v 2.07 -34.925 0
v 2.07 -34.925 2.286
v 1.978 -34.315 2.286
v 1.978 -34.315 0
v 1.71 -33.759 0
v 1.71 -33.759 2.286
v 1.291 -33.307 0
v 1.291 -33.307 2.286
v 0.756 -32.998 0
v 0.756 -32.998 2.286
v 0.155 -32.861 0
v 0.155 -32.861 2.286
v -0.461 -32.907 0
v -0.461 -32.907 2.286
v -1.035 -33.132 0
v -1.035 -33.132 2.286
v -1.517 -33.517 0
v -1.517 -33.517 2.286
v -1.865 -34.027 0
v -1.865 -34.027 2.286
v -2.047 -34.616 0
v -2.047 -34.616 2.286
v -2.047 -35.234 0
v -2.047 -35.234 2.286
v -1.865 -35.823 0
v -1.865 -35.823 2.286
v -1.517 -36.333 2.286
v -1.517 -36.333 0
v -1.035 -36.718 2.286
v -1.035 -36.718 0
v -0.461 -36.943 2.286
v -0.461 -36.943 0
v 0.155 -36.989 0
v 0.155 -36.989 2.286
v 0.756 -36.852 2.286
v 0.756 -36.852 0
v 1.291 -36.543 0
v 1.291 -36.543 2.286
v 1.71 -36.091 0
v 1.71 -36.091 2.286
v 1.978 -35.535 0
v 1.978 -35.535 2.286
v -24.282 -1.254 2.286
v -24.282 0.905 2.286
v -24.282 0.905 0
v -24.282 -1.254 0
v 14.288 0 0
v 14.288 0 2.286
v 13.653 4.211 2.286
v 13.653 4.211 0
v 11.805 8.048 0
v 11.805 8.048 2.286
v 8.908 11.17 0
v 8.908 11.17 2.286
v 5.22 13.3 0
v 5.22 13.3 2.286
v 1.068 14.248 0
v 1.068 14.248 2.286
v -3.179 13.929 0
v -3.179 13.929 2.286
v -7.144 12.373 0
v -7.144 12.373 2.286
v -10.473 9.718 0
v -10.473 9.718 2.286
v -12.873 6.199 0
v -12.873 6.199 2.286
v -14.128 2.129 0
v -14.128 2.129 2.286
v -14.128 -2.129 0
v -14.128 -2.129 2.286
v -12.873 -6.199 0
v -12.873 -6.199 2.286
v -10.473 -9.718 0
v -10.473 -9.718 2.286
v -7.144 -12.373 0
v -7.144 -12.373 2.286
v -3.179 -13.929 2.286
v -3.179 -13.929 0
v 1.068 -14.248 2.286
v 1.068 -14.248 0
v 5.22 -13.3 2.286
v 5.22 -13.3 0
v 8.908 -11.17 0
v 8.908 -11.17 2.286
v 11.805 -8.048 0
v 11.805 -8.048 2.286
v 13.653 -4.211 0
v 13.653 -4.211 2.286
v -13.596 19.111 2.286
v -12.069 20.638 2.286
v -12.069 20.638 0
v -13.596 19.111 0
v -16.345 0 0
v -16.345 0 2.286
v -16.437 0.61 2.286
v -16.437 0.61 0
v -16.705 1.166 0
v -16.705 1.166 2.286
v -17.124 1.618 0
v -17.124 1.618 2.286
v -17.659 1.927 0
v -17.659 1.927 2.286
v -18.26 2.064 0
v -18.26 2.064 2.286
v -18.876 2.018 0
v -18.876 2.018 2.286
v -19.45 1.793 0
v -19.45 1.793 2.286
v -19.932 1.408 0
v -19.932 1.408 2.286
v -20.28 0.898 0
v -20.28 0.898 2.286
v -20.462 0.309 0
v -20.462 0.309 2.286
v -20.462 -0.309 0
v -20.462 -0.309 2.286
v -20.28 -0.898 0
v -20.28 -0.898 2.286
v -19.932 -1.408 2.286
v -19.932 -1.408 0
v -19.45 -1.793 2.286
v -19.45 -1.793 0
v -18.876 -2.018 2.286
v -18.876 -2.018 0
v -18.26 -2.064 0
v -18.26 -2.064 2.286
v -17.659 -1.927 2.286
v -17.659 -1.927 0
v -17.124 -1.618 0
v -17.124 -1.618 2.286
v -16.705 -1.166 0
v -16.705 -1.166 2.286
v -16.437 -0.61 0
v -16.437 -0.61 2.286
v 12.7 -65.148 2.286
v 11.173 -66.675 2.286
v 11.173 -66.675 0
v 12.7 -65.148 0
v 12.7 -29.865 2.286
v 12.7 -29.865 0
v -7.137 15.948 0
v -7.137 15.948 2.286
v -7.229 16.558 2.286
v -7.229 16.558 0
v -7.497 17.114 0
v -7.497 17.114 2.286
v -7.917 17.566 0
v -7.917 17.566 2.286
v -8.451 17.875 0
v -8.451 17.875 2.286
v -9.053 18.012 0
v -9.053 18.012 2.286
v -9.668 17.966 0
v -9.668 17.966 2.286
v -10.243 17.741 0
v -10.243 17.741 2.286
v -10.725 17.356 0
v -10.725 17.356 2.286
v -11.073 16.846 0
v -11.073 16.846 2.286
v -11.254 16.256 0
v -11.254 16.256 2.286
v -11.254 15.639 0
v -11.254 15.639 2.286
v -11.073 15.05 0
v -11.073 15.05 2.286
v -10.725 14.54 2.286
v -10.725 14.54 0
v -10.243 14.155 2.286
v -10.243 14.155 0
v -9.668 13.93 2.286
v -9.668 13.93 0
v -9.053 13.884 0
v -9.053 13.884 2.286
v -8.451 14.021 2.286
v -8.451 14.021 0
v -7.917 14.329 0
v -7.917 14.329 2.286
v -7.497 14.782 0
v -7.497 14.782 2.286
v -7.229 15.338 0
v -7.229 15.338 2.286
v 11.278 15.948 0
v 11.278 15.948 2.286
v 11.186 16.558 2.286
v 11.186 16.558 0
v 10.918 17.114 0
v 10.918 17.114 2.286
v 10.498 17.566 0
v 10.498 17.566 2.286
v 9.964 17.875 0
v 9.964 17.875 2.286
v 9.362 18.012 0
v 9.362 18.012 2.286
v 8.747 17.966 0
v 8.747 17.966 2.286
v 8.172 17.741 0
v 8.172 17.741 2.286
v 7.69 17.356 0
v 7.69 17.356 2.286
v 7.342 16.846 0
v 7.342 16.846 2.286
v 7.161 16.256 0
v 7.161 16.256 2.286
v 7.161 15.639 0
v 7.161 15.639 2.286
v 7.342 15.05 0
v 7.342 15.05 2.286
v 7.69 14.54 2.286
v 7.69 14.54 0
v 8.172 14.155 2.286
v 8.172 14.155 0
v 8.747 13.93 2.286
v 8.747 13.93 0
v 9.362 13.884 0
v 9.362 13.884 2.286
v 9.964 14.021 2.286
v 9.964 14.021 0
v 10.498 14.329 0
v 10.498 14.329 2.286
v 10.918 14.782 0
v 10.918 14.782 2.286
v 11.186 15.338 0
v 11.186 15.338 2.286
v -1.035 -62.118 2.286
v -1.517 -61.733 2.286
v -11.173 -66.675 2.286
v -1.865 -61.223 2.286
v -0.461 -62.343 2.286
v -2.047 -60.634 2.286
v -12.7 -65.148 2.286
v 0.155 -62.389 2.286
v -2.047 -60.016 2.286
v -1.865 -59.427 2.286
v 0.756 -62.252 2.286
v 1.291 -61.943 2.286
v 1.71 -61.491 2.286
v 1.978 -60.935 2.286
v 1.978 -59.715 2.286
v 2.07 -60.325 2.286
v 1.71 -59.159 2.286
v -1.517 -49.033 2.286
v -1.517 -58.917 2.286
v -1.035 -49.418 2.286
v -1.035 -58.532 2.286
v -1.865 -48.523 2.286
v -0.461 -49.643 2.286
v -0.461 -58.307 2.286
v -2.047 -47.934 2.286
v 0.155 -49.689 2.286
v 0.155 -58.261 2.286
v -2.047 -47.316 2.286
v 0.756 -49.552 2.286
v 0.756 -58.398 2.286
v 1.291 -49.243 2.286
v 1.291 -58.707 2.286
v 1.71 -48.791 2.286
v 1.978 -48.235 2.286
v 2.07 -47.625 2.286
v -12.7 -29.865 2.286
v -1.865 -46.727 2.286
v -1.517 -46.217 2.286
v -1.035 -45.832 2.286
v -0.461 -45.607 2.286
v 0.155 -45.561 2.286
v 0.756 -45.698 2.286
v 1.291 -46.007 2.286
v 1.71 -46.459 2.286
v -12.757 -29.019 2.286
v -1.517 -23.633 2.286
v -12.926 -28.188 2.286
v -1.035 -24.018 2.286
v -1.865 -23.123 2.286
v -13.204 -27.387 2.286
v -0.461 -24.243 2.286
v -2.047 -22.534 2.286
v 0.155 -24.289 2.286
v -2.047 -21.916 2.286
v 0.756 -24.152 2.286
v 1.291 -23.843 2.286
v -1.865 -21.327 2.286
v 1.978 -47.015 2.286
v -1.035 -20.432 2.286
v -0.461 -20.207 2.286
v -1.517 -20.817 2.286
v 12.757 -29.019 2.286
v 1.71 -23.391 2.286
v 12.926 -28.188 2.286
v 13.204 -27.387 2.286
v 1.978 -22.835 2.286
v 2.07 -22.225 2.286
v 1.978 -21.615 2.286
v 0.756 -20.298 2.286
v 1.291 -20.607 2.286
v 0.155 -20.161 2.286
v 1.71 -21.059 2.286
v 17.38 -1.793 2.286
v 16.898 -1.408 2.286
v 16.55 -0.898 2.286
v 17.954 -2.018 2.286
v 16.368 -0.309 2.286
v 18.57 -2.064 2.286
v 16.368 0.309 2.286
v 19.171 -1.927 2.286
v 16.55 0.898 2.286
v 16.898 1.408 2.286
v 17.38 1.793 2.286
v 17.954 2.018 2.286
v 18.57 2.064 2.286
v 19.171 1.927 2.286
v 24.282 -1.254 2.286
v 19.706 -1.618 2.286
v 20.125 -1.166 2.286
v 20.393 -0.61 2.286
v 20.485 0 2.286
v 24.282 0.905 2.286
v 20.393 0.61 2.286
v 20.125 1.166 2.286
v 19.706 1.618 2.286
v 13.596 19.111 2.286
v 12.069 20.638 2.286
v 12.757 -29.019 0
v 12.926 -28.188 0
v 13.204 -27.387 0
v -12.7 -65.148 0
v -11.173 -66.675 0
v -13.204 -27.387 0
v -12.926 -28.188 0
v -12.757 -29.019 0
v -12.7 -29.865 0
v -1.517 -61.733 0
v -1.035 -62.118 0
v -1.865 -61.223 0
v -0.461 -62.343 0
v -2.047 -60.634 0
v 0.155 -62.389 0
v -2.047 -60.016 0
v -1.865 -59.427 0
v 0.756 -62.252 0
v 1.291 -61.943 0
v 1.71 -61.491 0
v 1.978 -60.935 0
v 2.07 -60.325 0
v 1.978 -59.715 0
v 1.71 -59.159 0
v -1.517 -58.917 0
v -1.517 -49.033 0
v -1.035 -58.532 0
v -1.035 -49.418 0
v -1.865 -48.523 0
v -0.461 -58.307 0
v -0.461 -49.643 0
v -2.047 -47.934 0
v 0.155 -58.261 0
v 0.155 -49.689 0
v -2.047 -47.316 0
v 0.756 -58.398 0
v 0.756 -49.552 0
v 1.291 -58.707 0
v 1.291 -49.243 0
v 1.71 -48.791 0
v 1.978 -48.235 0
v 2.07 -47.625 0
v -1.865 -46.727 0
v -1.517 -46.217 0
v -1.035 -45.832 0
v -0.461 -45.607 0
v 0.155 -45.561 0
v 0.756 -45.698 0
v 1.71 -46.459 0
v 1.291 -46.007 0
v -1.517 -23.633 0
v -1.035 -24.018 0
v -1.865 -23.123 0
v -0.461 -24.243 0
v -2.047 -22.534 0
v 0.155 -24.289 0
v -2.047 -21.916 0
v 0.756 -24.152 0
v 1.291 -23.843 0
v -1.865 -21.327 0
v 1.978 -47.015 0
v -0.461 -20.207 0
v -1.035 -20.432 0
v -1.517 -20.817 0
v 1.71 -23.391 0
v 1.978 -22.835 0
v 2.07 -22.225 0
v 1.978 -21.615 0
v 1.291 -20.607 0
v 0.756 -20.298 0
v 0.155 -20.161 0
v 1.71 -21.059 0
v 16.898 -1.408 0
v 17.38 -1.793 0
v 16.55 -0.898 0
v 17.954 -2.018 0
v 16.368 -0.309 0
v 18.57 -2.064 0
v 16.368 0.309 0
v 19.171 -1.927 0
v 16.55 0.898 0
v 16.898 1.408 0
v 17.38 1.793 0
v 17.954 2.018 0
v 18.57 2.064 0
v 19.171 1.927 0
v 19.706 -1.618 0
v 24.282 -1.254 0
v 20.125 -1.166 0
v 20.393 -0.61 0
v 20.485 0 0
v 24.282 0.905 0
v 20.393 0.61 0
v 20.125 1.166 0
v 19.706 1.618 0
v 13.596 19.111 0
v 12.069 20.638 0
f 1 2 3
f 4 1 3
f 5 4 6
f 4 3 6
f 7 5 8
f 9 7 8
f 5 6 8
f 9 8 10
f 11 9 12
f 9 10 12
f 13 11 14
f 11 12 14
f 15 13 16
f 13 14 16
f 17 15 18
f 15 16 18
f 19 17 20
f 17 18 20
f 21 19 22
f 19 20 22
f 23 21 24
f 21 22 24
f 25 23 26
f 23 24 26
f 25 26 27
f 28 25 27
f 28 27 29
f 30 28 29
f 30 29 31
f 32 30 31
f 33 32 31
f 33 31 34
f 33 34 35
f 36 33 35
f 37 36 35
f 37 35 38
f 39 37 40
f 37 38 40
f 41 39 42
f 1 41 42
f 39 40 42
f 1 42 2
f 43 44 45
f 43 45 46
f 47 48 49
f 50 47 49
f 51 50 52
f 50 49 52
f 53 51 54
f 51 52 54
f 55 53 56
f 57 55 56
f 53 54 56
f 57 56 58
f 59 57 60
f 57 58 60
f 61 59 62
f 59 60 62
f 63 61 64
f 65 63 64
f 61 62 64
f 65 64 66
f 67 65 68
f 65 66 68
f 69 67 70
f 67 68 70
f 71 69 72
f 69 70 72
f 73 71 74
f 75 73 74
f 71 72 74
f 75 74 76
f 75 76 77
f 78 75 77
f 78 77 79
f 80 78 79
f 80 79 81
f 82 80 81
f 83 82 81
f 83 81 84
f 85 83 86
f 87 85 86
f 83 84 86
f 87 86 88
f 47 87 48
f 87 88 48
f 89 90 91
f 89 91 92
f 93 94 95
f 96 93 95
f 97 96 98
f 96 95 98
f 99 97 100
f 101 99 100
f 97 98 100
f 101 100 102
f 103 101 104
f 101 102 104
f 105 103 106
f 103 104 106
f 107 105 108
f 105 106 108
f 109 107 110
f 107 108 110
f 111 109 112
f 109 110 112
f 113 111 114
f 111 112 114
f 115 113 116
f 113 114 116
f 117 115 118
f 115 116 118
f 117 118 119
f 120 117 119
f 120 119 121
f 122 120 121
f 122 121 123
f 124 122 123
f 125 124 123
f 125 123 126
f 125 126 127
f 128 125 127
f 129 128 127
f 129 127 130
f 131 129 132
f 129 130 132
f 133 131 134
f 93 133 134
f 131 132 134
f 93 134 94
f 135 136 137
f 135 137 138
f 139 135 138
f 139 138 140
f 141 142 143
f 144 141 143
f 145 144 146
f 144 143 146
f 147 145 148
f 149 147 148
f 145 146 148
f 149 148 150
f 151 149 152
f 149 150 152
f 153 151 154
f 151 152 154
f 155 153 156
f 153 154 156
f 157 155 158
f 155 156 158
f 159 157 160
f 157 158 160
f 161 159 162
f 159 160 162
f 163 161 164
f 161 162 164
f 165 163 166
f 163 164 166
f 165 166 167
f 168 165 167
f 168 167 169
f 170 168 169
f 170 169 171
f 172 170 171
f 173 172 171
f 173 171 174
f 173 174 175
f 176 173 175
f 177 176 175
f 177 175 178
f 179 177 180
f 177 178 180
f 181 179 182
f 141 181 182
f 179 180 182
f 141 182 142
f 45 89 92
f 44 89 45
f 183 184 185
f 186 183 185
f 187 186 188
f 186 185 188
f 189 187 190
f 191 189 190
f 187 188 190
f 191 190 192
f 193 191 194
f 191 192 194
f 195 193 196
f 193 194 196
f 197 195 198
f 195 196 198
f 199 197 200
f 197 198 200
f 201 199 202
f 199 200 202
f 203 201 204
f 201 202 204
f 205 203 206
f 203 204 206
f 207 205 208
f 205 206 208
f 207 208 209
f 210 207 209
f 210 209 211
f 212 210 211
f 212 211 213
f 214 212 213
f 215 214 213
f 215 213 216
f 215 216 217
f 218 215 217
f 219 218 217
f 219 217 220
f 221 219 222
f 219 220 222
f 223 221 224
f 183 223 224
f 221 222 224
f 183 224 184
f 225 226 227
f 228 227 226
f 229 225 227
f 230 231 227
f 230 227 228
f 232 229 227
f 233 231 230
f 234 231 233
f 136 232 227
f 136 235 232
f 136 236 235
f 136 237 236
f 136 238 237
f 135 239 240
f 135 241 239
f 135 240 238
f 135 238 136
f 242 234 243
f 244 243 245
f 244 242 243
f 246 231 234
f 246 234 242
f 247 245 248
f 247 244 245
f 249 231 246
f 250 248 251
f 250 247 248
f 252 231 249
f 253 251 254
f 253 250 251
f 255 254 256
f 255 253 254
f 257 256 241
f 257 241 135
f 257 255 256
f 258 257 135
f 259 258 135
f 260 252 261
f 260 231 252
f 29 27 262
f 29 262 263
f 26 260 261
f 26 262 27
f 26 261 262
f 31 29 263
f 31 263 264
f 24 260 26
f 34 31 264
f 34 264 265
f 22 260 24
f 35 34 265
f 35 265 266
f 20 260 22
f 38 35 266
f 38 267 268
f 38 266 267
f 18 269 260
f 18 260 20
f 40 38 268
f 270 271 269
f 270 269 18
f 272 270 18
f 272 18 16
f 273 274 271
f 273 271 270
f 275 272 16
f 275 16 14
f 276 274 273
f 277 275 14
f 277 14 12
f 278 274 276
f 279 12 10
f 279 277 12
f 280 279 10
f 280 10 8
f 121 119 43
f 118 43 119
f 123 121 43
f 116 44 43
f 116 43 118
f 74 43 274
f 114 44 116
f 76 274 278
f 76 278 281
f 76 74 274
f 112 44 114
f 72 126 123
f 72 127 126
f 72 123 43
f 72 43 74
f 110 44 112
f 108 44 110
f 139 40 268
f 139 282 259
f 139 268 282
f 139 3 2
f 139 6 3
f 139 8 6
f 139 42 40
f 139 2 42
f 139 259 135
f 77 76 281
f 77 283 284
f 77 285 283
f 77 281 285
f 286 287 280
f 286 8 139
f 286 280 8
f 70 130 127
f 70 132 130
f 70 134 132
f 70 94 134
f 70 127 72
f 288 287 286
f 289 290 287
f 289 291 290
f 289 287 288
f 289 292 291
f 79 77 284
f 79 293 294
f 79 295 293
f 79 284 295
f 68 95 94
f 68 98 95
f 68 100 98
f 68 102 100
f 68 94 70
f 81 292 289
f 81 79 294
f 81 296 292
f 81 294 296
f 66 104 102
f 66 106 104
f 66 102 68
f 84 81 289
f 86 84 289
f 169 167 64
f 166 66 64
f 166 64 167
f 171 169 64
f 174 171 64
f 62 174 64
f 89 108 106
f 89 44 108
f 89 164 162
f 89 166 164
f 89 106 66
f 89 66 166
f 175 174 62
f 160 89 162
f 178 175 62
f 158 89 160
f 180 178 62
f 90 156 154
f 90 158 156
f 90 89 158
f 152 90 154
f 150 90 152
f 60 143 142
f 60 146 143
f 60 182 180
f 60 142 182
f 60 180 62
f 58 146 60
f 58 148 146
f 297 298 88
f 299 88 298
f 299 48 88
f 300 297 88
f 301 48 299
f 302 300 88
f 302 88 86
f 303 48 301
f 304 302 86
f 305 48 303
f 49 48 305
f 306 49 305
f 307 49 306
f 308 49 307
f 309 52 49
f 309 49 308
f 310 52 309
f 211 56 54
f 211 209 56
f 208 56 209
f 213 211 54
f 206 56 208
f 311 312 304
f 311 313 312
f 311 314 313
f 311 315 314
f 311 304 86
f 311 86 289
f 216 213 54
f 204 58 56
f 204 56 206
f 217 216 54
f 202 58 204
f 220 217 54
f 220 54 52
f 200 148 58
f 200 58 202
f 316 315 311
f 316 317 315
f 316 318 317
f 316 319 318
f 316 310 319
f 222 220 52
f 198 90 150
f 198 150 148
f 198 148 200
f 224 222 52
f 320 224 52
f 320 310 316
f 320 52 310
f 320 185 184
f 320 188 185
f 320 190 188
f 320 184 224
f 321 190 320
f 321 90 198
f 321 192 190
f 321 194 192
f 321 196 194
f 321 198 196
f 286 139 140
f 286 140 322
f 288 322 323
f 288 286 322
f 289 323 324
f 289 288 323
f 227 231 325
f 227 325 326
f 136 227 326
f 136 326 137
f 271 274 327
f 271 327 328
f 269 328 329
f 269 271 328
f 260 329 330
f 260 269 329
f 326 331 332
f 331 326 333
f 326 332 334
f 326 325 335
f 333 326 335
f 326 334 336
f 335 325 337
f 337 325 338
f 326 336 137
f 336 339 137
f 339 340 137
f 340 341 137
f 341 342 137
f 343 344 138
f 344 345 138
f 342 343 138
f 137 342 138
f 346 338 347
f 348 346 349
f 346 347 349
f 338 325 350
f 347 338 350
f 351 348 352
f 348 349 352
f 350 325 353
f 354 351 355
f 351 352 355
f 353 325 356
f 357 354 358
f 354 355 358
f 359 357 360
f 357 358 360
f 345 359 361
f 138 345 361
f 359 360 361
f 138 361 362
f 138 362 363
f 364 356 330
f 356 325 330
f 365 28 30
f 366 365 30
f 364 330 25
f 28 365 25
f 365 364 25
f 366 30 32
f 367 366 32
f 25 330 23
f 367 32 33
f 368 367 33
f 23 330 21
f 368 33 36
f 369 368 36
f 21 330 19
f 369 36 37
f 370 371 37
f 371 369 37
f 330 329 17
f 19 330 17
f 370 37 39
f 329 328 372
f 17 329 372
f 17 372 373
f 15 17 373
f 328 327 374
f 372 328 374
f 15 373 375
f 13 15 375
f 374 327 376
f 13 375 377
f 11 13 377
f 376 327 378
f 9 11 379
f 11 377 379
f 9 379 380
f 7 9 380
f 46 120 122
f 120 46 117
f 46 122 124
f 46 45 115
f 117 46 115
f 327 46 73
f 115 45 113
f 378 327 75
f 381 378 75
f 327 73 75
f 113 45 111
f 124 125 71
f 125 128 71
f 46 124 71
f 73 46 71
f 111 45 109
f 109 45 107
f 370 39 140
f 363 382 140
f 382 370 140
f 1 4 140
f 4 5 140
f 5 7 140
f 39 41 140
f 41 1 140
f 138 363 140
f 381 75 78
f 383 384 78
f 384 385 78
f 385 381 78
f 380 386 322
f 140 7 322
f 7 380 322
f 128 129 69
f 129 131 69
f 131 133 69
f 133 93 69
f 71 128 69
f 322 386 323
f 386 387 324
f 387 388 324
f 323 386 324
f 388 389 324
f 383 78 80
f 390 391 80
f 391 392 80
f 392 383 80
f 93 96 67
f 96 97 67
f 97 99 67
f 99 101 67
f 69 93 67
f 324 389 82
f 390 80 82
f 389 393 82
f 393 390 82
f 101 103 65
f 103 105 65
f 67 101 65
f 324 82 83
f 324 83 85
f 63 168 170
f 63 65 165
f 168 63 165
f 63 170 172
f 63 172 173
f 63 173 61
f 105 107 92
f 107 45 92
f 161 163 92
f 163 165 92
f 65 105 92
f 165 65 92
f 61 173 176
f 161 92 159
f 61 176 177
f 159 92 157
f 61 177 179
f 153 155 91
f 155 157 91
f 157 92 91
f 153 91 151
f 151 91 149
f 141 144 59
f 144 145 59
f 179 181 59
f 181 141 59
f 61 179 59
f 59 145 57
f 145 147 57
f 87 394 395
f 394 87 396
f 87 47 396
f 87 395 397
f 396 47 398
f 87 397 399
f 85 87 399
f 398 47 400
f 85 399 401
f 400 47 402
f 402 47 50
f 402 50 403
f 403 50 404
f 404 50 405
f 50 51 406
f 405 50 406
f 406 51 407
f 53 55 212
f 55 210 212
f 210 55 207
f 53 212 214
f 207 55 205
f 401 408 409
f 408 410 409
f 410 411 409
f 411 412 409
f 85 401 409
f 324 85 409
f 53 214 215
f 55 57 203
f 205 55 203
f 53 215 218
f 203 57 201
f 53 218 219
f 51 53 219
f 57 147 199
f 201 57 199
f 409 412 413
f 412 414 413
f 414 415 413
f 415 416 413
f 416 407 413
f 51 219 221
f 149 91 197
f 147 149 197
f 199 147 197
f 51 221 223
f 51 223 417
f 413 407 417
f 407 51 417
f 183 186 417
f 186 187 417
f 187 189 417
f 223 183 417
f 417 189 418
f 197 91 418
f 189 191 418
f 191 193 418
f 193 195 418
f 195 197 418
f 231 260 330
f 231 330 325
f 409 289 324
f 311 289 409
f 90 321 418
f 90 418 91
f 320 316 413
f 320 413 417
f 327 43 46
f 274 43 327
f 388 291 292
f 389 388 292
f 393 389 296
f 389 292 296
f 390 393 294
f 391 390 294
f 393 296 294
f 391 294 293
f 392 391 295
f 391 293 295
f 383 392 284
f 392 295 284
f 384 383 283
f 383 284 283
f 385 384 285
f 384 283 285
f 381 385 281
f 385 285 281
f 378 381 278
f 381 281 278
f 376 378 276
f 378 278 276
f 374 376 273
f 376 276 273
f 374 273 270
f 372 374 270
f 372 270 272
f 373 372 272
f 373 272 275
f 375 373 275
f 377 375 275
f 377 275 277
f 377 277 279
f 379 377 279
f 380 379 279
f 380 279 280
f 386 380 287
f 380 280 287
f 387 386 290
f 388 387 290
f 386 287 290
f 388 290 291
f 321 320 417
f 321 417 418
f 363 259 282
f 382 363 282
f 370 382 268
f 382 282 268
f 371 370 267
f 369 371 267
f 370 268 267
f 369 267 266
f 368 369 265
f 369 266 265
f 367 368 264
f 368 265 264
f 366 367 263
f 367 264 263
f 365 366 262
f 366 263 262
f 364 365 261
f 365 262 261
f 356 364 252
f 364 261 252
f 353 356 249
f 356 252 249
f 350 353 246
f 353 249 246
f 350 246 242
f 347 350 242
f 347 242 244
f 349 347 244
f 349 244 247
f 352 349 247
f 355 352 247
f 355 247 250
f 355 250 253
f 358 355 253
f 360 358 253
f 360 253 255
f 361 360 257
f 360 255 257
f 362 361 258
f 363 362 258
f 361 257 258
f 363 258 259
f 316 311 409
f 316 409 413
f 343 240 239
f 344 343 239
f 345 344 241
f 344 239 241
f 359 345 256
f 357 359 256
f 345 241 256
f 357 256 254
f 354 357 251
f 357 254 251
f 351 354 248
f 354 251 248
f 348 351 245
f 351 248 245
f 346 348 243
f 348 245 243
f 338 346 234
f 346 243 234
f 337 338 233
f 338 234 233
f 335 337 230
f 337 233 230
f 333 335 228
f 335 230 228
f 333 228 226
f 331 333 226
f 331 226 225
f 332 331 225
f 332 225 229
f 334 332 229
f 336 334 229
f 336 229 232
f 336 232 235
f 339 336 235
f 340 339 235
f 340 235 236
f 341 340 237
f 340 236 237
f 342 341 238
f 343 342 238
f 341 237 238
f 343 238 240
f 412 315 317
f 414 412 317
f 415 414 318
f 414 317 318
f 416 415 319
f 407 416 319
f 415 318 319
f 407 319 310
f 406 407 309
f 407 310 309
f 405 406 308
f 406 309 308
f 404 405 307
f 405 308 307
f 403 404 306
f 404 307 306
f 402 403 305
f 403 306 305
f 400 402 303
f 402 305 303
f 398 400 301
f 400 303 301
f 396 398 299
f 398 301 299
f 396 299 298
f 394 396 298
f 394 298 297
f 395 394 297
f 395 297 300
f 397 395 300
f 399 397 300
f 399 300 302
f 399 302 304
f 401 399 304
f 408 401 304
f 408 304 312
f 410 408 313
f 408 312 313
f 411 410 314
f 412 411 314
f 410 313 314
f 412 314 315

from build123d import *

# Parameters (mm, degrees)
SKETCH1_R           = 2.0701
SKETCH1_R_2         = 14.2875
BOSS_EXTRUDE1_DEPTH = 2.286


with BuildPart() as part:
    # Sketch1 → Boss-Extrude1 (new body)
    with BuildSketch(Plane.XY.offset(2.286)):
        with BuildLine():
            Line((-24.282138093, -1.253612903), (-13.20363246, -27.386969147))
            ThreePointArc((-13.20363246, -27.386969147), (-12.827181753, -28.600844397), (-12.7, -29.865373188))
            Line((-12.7, -29.865373188), (-12.7, -65.148356459))
            Line((-12.7, -65.148356459), (-11.173356459, -66.675))
            Line((-11.173356459, -66.675), (11.173356459, -66.675))
            Line((11.173356459, -66.675), (12.7, -65.148356459))
            Line((12.7, -65.148356459), (12.7, -29.865373188))
            ThreePointArc((12.7, -29.865373188), (12.827181753, -28.600844397), (13.20363246, -27.386969147))
            Line((13.20363246, -27.386969147), (24.282138093, -1.253612903))
            Line((24.282138093, -1.253612903), (24.282138093, 0.905387097))
            Line((24.282138093, 0.905387097), (13.596092395, 19.110856459))
            Line((13.596092395, 19.110856459), (12.069448854, 20.6375))
            Line((12.069448854, 20.6375), (-12.069448854, 20.6375))
            Line((-12.069448854, 20.6375), (-13.596092395, 19.110856459))
            Line((-13.596092395, 19.110856459), (-24.282138093, 0.905387097))
            Line((-24.282138093, 0.905387097), (-24.282138093, -1.253612903))
        make_face()
        with Locations((-9.2075, 15.947857811)):
            Circle(SKETCH1_R, mode=Mode.SUBTRACT)
        with Locations((-18.415, 0)):
            Circle(SKETCH1_R, mode=Mode.SUBTRACT)
        with Locations((0, -47.625)):
            Circle(SKETCH1_R, mode=Mode.SUBTRACT)
        with Locations((0, -22.225)):
            Circle(SKETCH1_R, mode=Mode.SUBTRACT)
        Circle(SKETCH1_R_2, mode=Mode.SUBTRACT)
        with Locations((0, -34.925)):
            Circle(SKETCH1_R, mode=Mode.SUBTRACT)
        with Locations((0, -60.325)):
            Circle(SKETCH1_R, mode=Mode.SUBTRACT)
        with Locations((18.415, 0)):
            Circle(SKETCH1_R, mode=Mode.SUBTRACT)
        with Locations((9.2075, 15.947857811)):
            Circle(SKETCH1_R, mode=Mode.SUBTRACT)
    extrude(amount=-BOSS_EXTRUDE1_DEPTH)


solid = part.part
